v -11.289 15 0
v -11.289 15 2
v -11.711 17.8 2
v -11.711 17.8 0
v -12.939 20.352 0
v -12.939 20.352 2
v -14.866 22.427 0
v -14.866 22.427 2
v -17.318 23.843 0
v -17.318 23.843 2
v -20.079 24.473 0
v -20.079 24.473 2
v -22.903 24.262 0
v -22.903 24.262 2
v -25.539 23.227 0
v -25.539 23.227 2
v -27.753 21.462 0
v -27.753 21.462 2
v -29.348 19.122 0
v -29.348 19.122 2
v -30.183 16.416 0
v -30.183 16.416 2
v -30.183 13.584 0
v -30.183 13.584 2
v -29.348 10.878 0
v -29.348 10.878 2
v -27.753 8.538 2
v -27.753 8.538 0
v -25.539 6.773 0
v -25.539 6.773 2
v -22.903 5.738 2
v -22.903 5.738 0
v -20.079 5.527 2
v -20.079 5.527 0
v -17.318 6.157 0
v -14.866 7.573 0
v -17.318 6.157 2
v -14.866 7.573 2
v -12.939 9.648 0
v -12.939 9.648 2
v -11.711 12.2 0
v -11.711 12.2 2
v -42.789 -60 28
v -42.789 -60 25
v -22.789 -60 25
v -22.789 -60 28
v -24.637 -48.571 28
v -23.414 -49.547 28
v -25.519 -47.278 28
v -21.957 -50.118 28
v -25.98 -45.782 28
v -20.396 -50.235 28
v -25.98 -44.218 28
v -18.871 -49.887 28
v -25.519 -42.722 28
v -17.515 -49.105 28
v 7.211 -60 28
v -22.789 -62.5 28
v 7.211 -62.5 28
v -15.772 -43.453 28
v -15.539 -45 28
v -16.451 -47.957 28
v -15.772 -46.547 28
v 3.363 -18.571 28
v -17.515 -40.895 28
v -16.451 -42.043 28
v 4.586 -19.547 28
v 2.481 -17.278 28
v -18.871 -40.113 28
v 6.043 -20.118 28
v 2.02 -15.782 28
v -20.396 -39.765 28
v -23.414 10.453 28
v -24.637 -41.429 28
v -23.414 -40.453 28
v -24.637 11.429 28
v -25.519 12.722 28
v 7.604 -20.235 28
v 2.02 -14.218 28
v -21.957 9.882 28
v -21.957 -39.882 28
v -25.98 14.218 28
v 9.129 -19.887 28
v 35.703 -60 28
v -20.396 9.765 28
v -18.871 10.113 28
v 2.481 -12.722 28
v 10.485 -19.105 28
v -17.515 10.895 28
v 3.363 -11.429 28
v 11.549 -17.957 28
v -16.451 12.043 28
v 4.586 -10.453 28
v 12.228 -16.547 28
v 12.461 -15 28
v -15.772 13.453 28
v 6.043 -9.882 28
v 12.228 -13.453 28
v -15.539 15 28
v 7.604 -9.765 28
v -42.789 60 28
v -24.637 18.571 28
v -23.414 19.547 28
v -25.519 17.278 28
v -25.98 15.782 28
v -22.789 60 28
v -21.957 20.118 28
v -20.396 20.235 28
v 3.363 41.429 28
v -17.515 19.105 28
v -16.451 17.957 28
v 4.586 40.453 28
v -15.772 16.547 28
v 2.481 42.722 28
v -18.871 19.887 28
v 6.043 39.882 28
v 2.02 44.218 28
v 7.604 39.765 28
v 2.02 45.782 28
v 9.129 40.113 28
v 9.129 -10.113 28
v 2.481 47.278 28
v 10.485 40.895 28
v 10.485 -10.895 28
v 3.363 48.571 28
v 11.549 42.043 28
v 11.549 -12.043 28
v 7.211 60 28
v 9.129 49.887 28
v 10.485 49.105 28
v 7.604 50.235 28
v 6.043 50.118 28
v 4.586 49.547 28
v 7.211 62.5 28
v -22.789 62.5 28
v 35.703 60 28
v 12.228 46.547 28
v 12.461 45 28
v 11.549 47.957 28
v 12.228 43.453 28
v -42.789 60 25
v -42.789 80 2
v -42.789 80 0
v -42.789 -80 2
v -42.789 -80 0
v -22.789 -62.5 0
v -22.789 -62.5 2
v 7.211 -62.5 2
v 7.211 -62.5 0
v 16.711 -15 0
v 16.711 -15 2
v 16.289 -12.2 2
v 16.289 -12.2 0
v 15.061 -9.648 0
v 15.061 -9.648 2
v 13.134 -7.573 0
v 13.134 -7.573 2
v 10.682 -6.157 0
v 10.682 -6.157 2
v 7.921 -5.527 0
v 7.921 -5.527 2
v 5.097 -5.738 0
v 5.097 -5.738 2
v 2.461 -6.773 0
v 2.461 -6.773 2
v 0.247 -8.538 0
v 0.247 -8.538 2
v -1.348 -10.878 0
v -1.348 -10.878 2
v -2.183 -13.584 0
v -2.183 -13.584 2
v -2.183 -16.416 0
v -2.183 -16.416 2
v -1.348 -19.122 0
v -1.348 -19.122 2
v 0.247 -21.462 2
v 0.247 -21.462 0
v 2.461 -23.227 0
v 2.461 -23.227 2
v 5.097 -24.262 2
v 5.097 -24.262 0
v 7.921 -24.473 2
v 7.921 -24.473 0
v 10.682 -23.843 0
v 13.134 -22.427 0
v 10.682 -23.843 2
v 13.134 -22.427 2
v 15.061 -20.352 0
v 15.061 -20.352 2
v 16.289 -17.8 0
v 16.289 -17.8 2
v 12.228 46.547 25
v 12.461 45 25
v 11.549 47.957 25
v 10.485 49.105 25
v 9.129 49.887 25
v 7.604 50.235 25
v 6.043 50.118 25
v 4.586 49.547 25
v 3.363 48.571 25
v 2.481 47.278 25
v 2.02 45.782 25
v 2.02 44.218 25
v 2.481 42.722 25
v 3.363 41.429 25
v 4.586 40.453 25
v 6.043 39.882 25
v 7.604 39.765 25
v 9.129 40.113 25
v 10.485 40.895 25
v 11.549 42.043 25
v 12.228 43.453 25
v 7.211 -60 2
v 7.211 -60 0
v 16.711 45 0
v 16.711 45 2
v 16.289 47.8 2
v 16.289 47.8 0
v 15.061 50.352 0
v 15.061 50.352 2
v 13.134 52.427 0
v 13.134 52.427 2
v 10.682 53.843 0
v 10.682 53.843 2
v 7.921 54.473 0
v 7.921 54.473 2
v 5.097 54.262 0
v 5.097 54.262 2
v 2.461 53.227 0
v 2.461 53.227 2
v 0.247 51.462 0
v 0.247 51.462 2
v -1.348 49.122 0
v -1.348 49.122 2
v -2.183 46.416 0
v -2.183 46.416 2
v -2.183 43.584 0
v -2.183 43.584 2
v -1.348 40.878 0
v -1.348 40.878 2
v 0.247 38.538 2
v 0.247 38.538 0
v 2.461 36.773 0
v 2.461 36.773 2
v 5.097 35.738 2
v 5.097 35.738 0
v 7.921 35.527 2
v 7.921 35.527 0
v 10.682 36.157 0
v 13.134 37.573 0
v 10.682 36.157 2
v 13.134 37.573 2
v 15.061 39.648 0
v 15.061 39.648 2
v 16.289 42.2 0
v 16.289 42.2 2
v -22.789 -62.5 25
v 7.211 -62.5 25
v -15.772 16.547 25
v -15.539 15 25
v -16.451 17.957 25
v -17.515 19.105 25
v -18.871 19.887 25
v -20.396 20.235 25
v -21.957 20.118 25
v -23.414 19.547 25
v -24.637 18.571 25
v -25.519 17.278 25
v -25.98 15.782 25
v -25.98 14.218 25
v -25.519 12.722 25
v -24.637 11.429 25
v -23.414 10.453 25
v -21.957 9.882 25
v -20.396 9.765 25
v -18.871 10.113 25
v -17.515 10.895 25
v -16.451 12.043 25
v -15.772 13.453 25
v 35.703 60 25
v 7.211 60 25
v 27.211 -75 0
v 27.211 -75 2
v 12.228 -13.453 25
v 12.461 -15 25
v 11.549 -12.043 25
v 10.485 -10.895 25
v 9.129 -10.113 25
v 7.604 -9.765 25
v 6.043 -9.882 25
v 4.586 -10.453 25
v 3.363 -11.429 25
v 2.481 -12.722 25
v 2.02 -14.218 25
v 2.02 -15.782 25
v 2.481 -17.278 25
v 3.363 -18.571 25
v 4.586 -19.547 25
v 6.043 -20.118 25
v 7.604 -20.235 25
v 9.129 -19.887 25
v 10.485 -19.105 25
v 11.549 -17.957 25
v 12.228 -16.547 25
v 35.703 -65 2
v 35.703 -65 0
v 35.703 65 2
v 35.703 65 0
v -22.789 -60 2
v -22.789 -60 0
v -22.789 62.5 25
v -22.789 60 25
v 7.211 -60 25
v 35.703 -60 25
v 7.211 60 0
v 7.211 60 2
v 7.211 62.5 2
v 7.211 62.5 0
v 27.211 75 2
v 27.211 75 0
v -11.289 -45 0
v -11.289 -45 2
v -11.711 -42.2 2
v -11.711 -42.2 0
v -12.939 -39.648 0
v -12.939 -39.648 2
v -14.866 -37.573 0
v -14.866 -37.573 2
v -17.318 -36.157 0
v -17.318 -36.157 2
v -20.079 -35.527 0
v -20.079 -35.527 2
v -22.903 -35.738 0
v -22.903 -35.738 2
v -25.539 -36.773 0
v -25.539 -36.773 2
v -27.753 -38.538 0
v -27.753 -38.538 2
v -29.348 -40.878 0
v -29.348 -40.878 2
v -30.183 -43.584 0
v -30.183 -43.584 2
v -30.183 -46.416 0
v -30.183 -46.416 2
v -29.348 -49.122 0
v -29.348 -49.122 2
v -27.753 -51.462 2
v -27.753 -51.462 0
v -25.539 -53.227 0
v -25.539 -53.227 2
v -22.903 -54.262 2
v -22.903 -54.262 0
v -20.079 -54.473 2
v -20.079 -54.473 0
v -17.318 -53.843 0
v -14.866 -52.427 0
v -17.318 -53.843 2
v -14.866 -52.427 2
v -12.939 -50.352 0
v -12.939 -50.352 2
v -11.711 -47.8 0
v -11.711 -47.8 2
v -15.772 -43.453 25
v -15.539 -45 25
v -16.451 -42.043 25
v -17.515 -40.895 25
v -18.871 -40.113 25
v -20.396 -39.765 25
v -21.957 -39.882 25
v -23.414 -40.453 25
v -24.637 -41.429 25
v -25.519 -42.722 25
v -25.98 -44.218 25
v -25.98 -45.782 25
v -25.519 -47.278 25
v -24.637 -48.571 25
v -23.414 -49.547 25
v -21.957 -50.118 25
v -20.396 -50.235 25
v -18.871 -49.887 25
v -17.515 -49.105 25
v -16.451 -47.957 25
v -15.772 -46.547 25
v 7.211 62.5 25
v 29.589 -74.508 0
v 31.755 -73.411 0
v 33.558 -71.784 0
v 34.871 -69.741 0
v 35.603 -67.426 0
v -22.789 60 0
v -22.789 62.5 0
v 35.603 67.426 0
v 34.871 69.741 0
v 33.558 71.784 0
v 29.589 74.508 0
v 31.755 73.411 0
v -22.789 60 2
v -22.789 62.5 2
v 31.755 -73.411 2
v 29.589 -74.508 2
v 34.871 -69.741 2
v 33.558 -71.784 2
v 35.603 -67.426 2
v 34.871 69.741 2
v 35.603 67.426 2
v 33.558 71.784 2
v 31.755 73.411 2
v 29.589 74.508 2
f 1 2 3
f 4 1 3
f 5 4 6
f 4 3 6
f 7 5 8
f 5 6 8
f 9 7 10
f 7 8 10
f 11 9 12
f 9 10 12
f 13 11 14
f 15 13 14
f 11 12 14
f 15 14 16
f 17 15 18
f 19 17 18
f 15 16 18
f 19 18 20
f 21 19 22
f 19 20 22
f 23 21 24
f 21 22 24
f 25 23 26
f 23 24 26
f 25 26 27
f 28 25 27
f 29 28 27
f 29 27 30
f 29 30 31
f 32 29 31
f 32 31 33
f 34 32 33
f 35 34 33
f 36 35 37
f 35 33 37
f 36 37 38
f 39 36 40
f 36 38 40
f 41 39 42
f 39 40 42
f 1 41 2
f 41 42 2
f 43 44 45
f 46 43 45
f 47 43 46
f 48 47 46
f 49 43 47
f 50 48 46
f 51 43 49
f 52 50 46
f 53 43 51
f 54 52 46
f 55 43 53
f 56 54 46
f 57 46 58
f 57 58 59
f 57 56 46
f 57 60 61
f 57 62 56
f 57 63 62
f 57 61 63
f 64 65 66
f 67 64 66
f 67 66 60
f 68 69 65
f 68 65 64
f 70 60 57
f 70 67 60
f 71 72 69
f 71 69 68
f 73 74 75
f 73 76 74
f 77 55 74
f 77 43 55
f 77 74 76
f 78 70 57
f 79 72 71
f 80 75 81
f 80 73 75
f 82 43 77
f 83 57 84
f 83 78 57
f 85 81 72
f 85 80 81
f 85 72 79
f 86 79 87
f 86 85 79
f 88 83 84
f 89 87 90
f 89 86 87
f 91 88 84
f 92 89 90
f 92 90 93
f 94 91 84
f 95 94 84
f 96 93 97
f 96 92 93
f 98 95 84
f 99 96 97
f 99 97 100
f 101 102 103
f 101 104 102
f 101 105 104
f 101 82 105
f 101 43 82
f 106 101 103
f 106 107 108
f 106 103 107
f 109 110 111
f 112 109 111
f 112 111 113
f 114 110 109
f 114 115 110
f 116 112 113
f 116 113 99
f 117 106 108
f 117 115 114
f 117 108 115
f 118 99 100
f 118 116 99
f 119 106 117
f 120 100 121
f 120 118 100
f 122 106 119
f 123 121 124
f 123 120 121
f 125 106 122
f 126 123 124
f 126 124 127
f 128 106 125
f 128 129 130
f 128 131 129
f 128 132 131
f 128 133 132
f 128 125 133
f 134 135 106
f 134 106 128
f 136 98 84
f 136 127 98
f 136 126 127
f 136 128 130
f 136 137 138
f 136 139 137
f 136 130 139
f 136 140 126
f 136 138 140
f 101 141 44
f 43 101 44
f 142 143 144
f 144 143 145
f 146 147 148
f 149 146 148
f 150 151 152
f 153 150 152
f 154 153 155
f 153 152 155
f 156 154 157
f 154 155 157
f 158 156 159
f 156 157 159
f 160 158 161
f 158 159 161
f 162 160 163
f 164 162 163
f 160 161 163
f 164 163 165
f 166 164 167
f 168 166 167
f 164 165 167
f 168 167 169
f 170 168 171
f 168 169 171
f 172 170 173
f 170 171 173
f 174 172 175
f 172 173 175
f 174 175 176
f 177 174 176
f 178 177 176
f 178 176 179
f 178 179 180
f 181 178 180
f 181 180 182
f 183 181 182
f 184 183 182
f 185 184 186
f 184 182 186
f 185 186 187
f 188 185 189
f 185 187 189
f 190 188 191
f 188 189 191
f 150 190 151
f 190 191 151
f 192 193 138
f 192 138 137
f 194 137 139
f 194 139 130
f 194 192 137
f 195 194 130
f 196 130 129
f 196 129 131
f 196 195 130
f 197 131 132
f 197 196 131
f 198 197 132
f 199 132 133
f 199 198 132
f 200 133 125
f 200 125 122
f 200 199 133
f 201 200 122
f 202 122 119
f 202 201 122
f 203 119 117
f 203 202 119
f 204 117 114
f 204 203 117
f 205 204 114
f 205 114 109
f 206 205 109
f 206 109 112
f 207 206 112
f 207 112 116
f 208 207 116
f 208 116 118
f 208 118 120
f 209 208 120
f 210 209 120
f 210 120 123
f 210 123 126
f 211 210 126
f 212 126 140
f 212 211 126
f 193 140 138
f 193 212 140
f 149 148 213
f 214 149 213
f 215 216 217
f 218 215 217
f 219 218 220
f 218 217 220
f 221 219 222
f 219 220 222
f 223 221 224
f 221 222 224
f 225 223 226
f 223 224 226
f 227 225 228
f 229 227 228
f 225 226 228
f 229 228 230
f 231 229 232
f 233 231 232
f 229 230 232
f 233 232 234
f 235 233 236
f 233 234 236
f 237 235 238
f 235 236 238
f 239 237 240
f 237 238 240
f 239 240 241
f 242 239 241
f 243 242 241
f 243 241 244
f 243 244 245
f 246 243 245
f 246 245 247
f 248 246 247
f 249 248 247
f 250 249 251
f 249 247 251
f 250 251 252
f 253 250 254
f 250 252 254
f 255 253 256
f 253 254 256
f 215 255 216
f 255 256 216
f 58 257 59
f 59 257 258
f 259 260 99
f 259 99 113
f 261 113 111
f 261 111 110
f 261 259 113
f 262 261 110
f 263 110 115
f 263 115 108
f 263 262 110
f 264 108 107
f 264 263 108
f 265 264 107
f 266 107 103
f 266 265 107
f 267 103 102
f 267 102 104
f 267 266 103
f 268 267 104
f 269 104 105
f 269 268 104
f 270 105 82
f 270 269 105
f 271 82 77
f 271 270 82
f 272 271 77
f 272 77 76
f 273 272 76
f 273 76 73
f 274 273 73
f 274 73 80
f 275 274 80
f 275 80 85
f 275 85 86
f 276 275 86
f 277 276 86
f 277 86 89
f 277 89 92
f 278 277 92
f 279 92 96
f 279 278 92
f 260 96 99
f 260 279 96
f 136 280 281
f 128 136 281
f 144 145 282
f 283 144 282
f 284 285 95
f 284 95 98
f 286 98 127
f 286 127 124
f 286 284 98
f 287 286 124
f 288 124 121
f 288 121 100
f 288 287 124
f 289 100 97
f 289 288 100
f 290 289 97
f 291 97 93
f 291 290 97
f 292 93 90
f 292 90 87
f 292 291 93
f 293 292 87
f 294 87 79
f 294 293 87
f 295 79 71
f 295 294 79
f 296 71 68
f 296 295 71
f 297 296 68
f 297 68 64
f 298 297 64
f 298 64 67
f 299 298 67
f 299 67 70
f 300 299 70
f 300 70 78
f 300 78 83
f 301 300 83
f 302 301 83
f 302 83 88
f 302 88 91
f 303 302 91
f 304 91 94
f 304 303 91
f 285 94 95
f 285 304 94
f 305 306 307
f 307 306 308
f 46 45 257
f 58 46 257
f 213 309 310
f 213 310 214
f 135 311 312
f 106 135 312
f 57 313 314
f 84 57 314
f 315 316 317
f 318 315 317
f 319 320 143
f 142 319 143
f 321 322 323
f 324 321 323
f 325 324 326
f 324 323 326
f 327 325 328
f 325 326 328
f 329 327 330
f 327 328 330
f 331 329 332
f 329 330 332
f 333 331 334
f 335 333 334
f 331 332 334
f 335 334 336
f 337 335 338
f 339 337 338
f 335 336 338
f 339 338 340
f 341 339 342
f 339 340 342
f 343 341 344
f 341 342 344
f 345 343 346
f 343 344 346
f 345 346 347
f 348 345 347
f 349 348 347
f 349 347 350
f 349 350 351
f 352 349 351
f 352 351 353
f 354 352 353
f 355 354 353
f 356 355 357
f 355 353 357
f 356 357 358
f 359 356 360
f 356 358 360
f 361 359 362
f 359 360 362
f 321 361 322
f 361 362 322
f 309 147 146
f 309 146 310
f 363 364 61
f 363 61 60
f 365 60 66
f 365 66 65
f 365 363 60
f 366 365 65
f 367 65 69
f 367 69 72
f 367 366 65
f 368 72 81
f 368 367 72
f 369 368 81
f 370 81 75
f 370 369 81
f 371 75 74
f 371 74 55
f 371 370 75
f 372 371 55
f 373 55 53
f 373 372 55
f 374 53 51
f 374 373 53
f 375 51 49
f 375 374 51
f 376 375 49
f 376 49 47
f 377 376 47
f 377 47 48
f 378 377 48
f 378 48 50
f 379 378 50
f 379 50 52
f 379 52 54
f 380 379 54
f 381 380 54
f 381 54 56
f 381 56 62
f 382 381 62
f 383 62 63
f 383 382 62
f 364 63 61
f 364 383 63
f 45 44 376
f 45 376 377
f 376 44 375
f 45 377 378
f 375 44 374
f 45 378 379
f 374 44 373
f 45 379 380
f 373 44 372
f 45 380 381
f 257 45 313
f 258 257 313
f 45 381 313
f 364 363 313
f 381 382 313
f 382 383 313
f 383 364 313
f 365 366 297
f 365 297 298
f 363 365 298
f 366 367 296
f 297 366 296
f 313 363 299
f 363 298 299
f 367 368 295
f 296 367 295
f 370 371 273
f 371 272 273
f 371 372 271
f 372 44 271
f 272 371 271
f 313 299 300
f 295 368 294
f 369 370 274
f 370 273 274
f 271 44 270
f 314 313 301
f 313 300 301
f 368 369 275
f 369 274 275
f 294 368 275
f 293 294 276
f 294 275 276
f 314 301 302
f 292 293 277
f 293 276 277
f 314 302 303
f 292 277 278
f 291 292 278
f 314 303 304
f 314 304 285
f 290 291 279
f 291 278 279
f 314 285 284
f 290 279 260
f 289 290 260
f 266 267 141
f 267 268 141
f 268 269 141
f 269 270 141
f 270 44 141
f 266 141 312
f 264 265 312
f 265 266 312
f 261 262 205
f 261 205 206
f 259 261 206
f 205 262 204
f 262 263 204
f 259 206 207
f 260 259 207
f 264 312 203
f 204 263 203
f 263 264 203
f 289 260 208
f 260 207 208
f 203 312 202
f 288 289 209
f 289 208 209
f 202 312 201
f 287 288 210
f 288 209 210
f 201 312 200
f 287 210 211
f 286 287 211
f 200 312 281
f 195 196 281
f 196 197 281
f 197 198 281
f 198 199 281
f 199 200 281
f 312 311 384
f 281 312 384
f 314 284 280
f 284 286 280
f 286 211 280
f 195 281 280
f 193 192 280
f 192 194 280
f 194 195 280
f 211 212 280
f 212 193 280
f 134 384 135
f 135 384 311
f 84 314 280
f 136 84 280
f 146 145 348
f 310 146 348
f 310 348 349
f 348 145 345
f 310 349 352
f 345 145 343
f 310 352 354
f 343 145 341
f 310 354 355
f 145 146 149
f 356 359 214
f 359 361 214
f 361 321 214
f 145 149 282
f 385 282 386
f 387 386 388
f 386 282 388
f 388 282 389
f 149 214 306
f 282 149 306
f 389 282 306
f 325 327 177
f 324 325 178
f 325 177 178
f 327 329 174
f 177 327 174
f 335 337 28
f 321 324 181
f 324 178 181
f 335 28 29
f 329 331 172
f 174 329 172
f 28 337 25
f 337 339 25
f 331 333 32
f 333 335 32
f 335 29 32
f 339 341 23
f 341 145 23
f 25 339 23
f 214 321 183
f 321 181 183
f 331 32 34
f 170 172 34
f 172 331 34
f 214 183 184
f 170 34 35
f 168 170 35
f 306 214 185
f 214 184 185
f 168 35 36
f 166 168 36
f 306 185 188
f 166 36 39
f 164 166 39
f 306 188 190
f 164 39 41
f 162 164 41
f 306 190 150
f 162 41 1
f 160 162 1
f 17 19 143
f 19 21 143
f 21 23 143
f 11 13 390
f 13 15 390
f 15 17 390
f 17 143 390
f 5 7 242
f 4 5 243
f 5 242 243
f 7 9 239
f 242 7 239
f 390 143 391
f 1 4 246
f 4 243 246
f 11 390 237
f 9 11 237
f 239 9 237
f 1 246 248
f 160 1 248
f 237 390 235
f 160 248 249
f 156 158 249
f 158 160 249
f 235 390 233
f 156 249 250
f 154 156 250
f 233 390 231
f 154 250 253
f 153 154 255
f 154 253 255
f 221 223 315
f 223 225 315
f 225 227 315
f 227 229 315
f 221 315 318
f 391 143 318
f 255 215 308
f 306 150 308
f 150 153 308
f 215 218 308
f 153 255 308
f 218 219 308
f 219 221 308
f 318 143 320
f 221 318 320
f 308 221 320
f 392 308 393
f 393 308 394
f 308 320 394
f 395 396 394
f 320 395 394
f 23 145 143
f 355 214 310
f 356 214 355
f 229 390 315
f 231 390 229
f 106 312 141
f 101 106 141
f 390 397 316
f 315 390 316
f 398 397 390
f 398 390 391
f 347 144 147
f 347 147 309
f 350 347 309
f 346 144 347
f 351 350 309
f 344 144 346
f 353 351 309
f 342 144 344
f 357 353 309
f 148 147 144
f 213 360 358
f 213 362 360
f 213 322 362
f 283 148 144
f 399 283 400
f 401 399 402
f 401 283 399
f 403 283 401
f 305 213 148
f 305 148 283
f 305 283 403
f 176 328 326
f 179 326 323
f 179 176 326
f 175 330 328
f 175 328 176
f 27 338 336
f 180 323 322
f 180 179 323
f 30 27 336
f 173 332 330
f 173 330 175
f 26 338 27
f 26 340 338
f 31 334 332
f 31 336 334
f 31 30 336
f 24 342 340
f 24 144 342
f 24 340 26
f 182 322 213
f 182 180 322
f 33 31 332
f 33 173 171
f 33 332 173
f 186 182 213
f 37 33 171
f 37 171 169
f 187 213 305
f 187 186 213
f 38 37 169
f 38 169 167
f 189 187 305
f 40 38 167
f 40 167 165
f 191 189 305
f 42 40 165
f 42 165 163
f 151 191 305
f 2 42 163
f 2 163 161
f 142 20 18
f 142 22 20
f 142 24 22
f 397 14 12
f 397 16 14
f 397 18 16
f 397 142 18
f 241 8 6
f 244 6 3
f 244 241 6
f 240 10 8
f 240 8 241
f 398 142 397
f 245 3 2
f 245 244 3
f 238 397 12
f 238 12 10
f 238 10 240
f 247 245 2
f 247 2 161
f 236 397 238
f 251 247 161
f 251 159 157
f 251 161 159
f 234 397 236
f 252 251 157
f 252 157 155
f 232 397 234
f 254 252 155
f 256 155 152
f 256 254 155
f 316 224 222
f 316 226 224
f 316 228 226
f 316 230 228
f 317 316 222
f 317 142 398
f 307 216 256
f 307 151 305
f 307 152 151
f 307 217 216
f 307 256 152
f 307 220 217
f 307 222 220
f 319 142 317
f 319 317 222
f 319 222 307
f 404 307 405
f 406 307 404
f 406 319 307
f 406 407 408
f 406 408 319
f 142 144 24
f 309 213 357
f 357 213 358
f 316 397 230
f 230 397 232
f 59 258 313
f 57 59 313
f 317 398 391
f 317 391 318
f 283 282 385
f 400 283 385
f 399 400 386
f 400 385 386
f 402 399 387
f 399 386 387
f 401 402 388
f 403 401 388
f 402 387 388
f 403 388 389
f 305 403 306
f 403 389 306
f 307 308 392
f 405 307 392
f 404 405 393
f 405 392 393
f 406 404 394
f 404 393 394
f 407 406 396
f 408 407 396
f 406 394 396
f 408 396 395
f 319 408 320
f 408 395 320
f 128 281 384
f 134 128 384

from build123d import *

# Parameters (mm, degrees)
F1_DEPTH = 2
F2_R     = 9.5
F3_DEPTH = 2
F5_R     = 5.25
F6_DEPTH = 3
F7_W     = 30
F7_H     = 2.5
F8_DEPTH = 2


with BuildPart() as f1:
    # F0 (on Top) → F1 (new body)
    with BuildSketch(Plane.XY):
        with BuildLine():
            Line((27.211278, 75), (-42.788722, 80))
            Line((-42.788722, 80), (-42.788722, -80))
            Line((-42.788722, -80), (27.211278, -75))
            ThreePointArc((27.211278, -75), (33.557679, -71.783789), (35.702676, -65))
            Line((35.702676, -65), (35.702676, 65))
            ThreePointArc((35.702676, 65), (33.557679, 71.783789), (27.211278, 75))
        make_face()
    extrude(amount=F1_DEPTH)

    # F2 (on face) → F3 (cut, through all)
    with BuildSketch(Plane.XY.offset(2)):
        with Locations((7.211278, 45)):
            Circle(F2_R)
        with Locations((-20.788722, 15)):
            Circle(F2_R)
        with Locations((7.211278, -15)):
            Circle(F2_R)
        with Locations((-20.788722, -45)):
            Circle(F2_R)
    extrude(amount=-F3_DEPTH, mode=Mode.SUBTRACT)

    # F7 (on face) → F8 (cut, through all)
    with BuildSketch(Plane.XY.offset(2)):
        with Locations((-7.788722, 61.25)):
            Rectangle(F7_W, F7_H)
        with Locations((-7.788722, -61.25)):
            Rectangle(F7_W, F7_H)
    extrude(amount=-F8_DEPTH, mode=Mode.SUBTRACT)


with BuildPart() as f6:
    # F5 (on offset) → F6 (new body)
    with BuildSketch(Plane.XY.offset(25)):
        Polygon((-22.788722, 60), (-42.788722, 60), (-42.788722, -60), (-22.788722, -60), (-22.788722, -62.5), (7.211278, -62.5), (7.211278, -60), (35.702676, -60), (35.702676, 60), (7.211278, 60), (7.211278, 62.5), (-22.788722, 62.5), align=None)
        with Locations((-20.788722, -45)):
            Circle(F5_R, mode=Mode.SUBTRACT)
        with Locations((7.211278, -15)):
            Circle(F5_R, mode=Mode.SUBTRACT)
        with Locations((-20.788722, 15)):
            Circle(F5_R, mode=Mode.SUBTRACT)
        with Locations((7.211278, 45)):
            Circle(F5_R, mode=Mode.SUBTRACT)
    extrude(amount=F6_DEPTH)


solid = Compound([f1.part, f6.part])
